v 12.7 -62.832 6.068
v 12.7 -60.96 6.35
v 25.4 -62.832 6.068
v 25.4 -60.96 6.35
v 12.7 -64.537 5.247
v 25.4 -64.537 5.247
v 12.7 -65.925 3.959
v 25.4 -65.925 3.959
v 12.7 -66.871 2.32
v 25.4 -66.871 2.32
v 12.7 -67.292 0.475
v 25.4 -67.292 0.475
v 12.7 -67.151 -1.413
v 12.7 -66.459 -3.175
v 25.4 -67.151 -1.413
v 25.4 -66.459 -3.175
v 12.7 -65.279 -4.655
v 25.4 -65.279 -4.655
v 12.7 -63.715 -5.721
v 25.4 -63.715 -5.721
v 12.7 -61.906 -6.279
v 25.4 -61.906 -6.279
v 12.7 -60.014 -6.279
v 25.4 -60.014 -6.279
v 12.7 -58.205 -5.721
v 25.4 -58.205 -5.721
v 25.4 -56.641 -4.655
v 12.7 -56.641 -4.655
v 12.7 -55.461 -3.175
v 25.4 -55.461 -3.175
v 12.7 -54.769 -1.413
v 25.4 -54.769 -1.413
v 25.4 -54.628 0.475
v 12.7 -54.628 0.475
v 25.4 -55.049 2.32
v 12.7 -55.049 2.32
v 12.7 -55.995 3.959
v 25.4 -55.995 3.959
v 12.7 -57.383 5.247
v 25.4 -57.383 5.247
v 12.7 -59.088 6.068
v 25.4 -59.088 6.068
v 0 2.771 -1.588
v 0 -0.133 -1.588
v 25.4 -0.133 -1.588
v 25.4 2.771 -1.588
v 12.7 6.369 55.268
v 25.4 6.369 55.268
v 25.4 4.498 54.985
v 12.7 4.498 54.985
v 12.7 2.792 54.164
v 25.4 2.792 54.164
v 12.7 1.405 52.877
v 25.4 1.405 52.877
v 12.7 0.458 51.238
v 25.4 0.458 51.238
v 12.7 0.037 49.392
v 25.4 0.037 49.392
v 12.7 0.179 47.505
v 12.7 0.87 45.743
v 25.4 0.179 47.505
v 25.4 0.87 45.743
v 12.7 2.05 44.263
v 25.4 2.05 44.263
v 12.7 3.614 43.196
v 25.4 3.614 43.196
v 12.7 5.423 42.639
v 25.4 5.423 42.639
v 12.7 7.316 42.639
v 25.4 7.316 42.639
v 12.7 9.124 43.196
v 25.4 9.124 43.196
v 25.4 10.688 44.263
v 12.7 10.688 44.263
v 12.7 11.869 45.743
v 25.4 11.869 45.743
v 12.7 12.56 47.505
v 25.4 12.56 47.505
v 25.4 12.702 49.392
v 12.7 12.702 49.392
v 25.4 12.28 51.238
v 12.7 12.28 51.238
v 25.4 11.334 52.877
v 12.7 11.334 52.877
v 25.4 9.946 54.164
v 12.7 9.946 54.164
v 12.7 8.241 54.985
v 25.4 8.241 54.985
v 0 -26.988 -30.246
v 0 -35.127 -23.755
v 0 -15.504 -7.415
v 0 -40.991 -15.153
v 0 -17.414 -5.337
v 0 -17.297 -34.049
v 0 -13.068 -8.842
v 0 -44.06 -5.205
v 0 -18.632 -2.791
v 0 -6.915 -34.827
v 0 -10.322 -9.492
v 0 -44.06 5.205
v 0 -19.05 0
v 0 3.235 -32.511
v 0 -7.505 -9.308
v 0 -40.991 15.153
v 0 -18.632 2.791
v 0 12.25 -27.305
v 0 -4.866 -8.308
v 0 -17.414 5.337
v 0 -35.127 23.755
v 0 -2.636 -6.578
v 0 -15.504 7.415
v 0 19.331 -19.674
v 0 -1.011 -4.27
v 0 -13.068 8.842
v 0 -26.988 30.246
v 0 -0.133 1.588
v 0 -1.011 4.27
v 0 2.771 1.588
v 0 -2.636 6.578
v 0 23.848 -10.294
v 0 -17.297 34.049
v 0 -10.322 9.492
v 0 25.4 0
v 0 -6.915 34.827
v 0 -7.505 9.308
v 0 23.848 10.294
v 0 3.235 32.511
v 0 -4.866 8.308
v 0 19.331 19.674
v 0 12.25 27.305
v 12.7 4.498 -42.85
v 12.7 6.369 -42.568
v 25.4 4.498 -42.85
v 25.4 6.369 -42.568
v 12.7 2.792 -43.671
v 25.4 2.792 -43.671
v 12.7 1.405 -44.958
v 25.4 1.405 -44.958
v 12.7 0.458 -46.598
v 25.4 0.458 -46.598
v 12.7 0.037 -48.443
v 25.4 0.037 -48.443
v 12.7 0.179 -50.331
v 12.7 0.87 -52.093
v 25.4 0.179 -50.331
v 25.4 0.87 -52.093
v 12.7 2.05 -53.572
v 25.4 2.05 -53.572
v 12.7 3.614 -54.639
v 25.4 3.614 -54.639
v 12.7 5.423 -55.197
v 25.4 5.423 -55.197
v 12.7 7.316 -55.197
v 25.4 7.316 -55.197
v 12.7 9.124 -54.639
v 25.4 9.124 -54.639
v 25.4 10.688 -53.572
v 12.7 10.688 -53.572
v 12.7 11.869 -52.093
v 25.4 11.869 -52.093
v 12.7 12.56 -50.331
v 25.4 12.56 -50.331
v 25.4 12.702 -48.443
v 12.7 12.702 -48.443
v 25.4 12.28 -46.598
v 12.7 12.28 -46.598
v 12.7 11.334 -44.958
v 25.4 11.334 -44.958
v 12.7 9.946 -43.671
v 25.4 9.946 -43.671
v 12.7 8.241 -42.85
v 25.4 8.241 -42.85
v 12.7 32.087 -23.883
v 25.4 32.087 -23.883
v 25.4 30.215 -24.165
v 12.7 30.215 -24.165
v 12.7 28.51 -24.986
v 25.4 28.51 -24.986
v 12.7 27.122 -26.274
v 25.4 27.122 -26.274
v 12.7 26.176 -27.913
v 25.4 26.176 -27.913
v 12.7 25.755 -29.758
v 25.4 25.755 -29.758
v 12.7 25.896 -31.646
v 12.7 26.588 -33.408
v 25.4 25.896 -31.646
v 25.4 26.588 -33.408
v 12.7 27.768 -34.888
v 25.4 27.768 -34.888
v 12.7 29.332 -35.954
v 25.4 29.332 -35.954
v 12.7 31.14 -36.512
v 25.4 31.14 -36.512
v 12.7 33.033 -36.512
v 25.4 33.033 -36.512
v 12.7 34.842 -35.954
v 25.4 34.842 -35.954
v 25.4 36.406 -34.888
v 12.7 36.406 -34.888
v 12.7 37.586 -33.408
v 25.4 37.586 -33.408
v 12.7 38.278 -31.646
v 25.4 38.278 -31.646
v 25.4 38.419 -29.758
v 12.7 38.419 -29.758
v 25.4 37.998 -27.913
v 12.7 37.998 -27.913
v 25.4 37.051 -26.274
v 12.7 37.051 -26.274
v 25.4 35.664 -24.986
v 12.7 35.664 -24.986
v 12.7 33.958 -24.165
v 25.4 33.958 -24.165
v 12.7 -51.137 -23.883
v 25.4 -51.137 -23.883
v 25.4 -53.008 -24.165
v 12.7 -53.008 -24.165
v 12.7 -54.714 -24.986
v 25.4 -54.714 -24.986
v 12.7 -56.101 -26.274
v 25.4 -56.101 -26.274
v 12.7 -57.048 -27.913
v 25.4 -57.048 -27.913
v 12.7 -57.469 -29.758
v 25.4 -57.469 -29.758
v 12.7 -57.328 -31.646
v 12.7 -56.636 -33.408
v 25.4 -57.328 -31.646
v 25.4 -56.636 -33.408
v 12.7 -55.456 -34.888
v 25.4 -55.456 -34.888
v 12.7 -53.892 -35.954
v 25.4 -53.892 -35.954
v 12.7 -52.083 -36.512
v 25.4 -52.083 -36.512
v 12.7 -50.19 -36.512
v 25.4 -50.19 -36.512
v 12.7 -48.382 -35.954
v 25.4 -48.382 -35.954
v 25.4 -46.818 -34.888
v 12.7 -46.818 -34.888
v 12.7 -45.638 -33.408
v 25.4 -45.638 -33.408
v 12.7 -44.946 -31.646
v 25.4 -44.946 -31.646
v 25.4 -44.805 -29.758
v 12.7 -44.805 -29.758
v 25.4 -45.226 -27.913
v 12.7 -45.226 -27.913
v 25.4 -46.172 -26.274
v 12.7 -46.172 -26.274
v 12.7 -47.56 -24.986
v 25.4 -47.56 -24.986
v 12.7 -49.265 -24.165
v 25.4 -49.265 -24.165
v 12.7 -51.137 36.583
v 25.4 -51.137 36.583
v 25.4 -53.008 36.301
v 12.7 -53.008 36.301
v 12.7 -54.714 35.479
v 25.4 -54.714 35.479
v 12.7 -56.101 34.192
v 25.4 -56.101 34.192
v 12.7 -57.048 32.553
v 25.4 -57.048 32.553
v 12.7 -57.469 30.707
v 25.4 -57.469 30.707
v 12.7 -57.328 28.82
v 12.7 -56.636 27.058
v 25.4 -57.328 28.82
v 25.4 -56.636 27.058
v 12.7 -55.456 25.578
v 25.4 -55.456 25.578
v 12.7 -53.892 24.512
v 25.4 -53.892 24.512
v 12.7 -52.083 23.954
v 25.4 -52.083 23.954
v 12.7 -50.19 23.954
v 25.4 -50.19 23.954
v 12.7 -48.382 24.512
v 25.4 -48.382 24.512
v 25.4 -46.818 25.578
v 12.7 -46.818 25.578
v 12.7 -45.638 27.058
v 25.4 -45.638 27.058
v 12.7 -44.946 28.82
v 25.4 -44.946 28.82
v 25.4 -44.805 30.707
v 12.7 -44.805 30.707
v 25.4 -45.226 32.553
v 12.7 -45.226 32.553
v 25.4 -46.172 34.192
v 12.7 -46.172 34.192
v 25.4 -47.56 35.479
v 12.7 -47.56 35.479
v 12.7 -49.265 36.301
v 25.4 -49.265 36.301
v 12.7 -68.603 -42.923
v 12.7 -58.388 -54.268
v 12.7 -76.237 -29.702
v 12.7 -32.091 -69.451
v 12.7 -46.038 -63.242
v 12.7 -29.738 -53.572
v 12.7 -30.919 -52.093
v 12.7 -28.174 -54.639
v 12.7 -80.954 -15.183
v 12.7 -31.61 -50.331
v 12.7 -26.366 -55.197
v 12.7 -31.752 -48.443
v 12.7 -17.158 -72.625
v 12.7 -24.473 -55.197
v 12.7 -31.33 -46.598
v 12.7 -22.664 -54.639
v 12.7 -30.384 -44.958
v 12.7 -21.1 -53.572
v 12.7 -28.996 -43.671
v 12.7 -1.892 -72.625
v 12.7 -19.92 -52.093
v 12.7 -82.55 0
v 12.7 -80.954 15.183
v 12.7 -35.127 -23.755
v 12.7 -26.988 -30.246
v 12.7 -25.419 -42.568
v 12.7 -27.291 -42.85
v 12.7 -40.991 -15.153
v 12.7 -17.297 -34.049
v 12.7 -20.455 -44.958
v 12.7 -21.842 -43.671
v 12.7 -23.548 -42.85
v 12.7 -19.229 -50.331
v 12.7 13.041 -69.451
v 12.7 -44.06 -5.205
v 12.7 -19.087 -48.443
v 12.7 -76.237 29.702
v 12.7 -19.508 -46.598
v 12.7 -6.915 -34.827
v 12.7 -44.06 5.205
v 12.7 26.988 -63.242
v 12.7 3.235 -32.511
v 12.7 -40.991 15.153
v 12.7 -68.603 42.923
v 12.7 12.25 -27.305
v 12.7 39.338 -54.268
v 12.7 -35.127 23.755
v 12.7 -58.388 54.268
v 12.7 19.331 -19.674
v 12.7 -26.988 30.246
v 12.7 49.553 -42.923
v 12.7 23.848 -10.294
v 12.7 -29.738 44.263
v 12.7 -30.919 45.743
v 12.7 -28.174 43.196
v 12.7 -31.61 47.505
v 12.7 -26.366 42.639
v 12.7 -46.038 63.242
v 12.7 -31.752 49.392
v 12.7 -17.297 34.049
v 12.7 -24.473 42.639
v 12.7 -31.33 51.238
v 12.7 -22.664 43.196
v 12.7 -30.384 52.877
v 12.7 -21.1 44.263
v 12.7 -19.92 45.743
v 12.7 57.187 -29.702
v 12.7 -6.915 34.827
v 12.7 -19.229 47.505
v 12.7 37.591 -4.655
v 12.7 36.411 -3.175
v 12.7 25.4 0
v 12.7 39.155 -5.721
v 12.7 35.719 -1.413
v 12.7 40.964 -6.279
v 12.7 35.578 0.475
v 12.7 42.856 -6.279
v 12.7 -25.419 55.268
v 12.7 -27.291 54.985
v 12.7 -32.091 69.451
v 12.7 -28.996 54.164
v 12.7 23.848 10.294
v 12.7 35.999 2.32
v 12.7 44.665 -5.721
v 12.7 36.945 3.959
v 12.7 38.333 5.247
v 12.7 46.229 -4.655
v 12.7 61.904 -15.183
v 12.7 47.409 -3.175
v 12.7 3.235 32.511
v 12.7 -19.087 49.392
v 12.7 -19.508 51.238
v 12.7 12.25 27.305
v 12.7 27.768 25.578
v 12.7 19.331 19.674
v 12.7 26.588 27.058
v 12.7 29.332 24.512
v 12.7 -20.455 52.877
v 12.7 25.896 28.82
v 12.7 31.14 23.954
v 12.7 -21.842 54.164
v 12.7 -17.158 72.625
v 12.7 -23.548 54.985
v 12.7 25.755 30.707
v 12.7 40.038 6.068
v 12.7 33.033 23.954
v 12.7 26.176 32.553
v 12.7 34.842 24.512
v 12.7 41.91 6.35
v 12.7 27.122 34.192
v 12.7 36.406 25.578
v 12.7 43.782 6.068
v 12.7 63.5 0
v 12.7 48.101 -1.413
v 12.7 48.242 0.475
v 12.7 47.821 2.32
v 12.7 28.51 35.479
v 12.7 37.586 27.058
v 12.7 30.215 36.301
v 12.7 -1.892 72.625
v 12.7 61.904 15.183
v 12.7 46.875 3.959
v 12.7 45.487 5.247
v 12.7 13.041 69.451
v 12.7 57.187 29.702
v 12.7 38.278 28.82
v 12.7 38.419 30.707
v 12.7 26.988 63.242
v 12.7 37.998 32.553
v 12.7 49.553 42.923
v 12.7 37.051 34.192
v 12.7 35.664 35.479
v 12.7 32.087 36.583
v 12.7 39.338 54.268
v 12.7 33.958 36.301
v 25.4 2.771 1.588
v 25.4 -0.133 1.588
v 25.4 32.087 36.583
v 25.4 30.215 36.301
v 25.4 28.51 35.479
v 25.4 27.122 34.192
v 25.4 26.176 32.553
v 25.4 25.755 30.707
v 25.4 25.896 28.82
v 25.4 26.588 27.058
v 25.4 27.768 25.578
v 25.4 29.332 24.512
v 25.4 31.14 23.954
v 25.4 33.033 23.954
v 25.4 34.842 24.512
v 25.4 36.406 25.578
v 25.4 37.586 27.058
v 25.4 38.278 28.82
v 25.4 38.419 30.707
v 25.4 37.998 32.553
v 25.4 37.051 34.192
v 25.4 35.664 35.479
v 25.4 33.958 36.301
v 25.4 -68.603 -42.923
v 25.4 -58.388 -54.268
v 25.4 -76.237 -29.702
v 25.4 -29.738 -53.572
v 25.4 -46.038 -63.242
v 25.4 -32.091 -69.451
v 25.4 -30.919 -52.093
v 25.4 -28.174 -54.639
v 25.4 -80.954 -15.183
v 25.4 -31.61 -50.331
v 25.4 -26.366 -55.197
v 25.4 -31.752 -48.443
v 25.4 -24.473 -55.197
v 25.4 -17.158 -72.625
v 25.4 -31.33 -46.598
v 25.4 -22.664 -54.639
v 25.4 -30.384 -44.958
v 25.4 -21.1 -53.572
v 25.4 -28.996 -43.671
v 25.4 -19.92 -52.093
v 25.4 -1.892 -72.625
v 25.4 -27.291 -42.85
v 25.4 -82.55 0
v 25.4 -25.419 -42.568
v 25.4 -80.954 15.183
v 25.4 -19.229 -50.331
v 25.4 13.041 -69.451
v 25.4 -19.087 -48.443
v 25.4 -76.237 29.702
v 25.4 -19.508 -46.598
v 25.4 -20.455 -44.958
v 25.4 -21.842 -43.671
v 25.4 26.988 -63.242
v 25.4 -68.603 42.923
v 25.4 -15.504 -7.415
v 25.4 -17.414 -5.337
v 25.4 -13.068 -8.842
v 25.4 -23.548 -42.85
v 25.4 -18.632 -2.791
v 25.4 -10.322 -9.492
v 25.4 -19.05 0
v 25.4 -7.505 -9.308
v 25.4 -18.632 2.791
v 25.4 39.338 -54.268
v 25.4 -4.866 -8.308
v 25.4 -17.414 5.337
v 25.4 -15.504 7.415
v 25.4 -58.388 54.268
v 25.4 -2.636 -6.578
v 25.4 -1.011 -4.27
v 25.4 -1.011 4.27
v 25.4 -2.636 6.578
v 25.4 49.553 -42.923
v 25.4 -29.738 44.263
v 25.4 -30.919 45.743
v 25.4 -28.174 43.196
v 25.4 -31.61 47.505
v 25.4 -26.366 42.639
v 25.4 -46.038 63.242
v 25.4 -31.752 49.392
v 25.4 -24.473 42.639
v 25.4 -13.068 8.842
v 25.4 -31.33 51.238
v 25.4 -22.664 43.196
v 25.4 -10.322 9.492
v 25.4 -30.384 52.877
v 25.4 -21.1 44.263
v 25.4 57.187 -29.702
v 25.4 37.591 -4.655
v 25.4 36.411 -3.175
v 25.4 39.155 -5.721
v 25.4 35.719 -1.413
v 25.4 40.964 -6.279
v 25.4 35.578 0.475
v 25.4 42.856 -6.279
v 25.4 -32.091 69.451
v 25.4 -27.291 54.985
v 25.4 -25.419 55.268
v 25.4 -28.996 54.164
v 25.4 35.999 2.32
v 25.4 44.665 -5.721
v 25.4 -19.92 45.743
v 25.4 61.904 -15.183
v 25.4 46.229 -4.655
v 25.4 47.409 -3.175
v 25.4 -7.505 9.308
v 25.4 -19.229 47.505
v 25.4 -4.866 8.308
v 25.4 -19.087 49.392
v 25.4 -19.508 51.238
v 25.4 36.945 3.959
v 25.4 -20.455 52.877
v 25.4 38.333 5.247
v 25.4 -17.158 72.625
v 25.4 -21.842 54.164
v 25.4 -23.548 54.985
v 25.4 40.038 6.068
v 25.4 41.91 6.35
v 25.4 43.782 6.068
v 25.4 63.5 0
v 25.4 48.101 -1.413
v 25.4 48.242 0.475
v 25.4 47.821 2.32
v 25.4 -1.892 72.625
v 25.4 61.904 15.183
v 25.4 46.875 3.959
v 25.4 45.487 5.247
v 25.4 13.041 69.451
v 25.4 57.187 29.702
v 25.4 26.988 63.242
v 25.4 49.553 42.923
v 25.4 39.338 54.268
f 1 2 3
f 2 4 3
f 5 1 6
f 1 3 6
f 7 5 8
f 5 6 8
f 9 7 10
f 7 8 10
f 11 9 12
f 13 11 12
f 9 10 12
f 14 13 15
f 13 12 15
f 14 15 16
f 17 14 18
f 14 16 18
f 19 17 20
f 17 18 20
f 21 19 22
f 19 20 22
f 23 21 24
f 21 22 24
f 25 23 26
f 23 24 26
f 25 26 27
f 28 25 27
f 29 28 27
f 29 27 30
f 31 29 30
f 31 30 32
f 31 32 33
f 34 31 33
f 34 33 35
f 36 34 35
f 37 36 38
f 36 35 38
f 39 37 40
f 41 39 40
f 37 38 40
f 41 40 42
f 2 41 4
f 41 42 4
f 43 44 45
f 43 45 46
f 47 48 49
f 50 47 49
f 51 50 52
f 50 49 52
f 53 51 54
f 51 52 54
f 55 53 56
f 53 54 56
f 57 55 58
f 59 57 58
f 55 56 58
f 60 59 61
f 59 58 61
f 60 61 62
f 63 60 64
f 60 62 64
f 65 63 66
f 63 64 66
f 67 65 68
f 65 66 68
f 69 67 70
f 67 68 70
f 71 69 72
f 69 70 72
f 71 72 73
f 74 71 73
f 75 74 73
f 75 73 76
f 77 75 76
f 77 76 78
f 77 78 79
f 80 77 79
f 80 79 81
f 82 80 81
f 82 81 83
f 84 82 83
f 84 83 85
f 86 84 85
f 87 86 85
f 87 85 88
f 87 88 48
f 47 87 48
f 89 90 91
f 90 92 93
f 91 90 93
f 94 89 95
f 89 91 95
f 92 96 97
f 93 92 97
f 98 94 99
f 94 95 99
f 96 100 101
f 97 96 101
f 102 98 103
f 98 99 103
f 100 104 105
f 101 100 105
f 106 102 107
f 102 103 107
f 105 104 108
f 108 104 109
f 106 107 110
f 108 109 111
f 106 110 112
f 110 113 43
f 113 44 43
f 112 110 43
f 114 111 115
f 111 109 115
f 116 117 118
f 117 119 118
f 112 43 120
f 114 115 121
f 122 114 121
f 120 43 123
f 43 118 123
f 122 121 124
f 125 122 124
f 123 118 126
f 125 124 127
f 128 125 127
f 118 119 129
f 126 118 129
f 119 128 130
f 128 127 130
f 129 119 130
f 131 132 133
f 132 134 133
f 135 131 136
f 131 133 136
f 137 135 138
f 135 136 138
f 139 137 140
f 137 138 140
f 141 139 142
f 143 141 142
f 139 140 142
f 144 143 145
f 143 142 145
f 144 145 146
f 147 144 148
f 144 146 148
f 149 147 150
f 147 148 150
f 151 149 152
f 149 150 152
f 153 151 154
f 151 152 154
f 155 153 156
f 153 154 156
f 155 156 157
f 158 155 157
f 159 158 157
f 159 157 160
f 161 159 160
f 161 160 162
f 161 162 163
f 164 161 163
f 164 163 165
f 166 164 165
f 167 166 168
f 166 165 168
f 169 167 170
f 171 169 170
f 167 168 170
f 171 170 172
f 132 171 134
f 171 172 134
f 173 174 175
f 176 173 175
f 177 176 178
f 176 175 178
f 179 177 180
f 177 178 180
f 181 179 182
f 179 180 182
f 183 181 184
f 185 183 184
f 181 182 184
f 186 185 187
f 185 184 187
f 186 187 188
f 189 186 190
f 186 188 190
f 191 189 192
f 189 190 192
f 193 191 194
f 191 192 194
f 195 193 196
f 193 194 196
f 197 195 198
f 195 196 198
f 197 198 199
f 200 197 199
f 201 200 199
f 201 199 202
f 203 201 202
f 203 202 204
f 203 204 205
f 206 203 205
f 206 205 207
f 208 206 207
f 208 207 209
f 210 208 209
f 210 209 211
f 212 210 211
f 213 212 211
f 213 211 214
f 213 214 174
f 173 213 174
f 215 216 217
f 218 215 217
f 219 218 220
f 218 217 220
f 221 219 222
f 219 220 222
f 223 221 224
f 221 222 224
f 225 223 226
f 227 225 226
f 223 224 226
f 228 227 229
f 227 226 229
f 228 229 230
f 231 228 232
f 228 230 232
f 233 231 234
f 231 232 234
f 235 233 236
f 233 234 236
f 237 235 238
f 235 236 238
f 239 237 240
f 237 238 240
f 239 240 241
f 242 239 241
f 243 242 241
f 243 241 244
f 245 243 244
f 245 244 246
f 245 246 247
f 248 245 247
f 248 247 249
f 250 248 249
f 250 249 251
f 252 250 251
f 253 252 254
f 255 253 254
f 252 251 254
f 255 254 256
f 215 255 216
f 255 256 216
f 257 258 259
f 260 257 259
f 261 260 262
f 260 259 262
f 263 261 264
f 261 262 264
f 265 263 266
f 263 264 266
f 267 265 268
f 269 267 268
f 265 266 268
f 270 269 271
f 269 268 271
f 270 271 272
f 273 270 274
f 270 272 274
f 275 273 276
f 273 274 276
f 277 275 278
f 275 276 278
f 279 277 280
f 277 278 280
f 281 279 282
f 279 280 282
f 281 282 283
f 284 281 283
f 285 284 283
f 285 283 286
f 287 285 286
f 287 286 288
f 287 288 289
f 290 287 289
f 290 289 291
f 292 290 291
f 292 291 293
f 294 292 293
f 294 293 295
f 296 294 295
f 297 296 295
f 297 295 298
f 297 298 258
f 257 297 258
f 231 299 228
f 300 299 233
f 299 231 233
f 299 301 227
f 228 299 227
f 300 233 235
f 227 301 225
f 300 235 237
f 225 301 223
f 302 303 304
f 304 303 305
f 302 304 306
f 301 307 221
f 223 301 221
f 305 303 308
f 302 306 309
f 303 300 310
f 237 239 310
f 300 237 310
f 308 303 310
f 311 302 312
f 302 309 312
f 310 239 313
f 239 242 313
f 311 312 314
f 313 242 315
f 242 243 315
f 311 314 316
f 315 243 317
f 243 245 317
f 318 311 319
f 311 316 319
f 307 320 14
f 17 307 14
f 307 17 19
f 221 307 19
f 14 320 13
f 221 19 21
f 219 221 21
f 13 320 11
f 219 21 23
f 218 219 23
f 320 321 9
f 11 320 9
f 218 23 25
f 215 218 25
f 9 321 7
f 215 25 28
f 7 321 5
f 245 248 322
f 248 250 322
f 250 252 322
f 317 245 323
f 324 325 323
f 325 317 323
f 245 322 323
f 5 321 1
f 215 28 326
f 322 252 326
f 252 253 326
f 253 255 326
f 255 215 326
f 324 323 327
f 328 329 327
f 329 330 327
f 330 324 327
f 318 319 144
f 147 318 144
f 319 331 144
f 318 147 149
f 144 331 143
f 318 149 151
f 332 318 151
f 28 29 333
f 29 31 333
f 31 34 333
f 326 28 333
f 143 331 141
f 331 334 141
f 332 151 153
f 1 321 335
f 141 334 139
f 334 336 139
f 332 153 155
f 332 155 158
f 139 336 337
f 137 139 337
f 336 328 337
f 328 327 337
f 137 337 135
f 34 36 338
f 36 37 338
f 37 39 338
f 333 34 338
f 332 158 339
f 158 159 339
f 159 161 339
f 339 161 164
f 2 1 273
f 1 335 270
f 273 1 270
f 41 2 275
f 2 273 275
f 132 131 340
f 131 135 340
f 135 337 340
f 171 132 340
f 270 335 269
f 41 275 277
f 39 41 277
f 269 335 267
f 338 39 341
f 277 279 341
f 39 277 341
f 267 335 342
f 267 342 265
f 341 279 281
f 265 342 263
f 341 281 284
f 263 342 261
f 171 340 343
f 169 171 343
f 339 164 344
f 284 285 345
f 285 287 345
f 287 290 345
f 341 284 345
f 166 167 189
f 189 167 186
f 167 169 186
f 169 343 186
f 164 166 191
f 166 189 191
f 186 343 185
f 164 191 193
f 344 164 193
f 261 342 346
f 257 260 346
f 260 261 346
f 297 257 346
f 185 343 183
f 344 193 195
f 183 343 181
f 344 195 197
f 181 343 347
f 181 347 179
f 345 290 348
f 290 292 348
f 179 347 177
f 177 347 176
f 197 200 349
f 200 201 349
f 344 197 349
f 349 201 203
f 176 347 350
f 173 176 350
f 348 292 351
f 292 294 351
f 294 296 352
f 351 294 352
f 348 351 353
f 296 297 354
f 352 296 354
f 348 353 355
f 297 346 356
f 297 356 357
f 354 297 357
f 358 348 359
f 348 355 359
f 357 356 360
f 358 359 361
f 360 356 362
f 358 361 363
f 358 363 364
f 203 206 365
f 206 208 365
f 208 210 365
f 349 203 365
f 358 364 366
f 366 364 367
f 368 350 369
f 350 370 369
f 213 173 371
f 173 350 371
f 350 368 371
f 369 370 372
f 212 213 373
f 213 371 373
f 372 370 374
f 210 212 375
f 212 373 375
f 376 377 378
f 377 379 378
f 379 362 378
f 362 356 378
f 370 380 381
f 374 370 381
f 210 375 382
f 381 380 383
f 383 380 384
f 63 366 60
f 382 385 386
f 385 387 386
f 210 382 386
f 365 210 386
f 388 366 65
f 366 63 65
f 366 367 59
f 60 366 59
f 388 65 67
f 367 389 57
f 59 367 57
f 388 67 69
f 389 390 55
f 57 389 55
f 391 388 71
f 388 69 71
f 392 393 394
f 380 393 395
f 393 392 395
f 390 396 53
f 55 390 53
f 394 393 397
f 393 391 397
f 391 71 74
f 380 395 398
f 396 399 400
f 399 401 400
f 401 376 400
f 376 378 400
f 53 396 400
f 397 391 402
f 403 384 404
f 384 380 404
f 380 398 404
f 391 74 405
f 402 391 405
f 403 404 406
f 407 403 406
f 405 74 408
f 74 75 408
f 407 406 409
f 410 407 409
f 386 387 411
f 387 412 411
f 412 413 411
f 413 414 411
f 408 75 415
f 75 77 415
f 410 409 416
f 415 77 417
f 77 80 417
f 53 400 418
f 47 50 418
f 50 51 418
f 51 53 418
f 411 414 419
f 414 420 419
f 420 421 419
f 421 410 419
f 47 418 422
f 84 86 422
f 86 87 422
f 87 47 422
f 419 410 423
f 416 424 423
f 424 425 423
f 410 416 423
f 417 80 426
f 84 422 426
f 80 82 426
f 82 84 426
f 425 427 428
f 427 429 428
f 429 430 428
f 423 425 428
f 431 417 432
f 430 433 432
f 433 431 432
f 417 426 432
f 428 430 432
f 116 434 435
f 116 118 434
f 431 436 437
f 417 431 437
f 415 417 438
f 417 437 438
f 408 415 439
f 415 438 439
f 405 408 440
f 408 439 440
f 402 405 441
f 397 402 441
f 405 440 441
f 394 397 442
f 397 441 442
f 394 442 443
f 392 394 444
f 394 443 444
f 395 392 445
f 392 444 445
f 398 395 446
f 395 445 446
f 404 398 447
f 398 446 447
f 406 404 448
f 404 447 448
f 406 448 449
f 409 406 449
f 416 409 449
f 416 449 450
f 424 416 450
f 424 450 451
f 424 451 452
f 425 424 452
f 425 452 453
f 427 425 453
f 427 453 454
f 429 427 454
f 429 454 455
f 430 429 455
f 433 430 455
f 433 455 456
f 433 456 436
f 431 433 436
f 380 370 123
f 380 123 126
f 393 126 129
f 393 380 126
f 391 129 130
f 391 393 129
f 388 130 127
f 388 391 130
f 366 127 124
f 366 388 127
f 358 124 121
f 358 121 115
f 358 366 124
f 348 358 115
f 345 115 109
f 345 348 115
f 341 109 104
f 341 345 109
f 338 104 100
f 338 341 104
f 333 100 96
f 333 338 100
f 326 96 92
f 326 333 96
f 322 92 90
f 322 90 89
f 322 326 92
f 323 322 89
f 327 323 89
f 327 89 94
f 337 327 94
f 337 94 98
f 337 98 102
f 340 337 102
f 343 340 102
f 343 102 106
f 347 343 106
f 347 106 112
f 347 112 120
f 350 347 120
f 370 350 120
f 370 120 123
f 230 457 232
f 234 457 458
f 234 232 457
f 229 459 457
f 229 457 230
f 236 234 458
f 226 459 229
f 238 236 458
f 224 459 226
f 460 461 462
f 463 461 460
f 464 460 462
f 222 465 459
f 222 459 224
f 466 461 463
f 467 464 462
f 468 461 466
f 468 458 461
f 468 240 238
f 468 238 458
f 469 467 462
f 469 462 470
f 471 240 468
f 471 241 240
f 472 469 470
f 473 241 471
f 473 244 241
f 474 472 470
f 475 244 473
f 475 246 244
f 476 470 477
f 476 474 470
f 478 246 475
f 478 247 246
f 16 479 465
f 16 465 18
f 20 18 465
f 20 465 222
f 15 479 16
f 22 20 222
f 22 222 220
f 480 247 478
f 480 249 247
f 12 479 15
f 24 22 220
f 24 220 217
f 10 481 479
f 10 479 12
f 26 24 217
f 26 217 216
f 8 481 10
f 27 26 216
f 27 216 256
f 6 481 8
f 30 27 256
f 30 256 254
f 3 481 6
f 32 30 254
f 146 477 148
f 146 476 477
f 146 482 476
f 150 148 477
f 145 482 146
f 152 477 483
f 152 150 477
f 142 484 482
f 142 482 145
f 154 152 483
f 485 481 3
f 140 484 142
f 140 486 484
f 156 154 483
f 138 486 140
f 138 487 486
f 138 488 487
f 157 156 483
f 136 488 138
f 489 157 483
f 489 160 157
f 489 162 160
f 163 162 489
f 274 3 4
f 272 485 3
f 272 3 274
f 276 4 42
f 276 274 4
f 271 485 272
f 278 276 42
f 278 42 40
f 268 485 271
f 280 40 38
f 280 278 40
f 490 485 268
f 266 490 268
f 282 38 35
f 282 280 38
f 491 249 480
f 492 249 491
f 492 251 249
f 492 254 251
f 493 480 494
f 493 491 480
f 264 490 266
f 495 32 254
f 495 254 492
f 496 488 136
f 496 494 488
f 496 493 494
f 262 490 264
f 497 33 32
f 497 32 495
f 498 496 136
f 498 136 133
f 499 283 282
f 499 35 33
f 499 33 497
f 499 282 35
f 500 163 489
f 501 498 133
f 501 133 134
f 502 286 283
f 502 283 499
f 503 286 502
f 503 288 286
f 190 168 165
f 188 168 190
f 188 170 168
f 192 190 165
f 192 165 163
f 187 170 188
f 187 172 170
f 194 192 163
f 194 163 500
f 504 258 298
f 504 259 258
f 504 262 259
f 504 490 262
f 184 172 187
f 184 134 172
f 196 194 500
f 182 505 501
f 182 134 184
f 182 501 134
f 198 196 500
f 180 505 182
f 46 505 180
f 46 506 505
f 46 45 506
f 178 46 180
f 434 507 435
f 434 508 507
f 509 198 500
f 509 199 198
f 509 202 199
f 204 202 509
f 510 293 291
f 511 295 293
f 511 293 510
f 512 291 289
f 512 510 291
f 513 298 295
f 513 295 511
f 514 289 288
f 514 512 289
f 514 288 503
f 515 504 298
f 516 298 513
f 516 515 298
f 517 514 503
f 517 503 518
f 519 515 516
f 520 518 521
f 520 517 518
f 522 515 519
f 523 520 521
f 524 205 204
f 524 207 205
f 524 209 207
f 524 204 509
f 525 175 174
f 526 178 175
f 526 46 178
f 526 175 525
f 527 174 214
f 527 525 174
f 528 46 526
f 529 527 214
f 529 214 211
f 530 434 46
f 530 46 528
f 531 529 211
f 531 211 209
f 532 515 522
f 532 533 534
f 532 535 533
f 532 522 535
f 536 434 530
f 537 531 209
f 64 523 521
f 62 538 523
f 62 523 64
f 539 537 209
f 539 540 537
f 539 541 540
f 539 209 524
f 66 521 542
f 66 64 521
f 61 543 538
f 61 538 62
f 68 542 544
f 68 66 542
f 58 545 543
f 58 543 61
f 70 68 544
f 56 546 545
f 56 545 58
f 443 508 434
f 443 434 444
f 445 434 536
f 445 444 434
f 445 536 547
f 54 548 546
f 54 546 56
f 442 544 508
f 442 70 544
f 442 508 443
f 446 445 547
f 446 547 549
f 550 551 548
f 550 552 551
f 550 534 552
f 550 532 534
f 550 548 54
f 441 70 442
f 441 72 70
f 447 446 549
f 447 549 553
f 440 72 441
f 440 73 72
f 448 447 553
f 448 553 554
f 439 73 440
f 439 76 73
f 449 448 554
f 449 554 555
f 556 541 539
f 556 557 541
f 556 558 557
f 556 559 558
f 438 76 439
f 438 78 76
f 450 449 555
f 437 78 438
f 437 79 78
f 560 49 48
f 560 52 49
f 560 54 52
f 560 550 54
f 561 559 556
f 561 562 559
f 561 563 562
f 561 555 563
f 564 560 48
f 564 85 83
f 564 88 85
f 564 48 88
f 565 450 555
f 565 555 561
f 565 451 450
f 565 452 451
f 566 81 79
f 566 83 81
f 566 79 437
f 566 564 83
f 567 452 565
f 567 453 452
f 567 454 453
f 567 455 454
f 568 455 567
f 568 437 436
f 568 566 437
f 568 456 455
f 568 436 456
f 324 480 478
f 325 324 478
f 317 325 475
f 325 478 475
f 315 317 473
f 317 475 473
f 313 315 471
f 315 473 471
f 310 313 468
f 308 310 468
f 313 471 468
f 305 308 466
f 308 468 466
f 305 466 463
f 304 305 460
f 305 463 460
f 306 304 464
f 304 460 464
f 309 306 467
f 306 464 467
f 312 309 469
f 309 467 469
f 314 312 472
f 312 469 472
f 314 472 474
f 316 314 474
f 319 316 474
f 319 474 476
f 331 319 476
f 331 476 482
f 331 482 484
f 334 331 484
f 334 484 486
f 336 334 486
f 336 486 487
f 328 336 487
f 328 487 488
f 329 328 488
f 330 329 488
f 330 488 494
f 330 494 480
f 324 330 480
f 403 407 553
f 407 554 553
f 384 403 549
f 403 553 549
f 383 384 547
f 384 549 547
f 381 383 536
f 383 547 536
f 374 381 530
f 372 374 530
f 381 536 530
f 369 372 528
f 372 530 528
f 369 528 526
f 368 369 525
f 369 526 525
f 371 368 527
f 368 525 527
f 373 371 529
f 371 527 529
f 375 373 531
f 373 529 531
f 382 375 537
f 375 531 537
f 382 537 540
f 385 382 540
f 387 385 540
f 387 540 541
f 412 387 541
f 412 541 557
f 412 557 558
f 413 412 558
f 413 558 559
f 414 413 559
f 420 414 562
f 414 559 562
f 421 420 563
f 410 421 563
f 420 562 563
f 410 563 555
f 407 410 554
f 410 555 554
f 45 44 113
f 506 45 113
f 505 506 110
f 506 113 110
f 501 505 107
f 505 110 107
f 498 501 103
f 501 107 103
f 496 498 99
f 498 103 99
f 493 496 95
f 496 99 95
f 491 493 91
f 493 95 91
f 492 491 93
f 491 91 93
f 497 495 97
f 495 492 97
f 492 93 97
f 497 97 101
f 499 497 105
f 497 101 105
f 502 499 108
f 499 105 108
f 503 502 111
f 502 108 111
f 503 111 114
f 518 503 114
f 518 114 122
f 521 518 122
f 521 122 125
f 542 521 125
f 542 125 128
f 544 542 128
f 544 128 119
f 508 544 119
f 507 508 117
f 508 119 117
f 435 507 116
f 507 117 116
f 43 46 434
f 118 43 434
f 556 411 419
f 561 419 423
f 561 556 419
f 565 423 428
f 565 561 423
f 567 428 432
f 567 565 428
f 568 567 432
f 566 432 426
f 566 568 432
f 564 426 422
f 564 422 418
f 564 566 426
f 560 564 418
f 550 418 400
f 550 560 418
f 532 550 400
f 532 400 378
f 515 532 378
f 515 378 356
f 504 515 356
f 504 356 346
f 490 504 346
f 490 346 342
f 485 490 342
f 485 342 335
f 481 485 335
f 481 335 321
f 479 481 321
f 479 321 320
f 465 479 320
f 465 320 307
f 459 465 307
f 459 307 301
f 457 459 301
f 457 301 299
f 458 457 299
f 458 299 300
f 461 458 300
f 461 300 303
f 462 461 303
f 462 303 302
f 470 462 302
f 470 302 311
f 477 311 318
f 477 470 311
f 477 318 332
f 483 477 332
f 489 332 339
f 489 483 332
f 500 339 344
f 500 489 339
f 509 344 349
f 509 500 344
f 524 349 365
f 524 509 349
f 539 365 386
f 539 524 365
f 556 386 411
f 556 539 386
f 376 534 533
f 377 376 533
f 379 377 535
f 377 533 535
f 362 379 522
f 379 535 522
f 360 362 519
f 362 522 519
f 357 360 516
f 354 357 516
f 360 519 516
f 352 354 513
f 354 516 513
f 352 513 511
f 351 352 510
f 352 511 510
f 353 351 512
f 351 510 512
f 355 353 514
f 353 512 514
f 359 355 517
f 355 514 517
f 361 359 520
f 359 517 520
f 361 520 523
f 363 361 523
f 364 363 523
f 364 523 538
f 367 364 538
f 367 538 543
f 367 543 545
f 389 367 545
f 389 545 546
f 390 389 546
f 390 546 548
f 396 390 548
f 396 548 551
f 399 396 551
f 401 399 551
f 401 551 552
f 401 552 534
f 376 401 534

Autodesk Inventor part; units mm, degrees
ref_plane "YZ Plane" through (0, 0, 0) normal (1, 0, 0) x (0, 1, 0)
ref_plane "XZ Plane" through (0, 0, 0) normal (0, 1, 0) x (-1, 0, 0)
ref_plane "XY Plane" through (0, 0, 0) normal (0, 0, 1) x (1, 0, 0)
sketch "Sketch1" plane through (0, 0, 0) normal (0, 0, 1) x (1, 0, 0)
  line L0 (0, 0) -> (0, 25.4)
  line L1 (0, 25.4) -> (12.7, 25.4)
  line L2 (12.7, 25.4) -> (12.7, 63.5)
  line L3 (12.7, 63.5) -> (25.4, 63.5)
  line L4 (25.4, 63.5) -> (25.4, 0)
  line L5 (25.4, 0) -> (0, 0)
  line L6 (0, -9.525) -> (25.4, -9.525)
  dimension "d0" = 25.4
  dimension "d1" = 63.5
  dimension "d2" = 12.7
  dimension "d3" = 25.4
  dimension "d4" = 9.525
revolve "Revolution1" add sketch "Sketch1" angle 360 about axis through (0, -9.525, 0) along (1, 0, 0)
sketch "Sketch2" plane through (12.7, -9.525, 0) normal (-1, 0, 0) x (0, 0, 1)
  circle A0 centre (0, 0) radius 51.435 construction
  circle A1 centre (0, 0) radius 9.525 projected
  circle A2 centre (0, 0) radius 73.025 projected
  circle A3 centre (0, 0) radius 34.925 projected
  point P0 (0, 9.525)
  point P1 (0, 51.435)
  point P2 (-30.2327, 41.6118)
  point P3 (-48.9176, 15.8943)
  point P4 (-48.9176, -15.8943)
  point P5 (-30.2327, -41.6118)
  point P6 (0, -51.435)
  point P7 (30.2327, -41.6118)
  point P8 (48.9176, -15.8943)
  point P9 (48.9176, 15.8943)
  point P10 (30.2327, 41.6118)
  dimension "d7" = 41.91
  dimension "d17" = 360
hole "Hole1" at (12.7, 41.91, 0) direction (1, 0, 0) diameter 12.7 end through all
hole "Hole2" at (12.7, 32.0868, -30.2327) at (12.7, 6.3693, -48.9176) at (12.7, -25.4193, -48.9176) at (12.7, -51.1368, -30.2327) at (12.7, -60.96, 0) at (12.7, -51.1368, 30.2327) at (12.7, -25.4193, 48.9176) at (12.7, 6.3693, 48.9176) at (12.7, 32.0868, 30.2327) direction (1, 0, 0) diameter 12.7 end through all
sketch "Sketch3" plane through (0, -9.525, 0) normal (-1, 0, 0) x (0, 0, 1)
  line L0 (-1.5875, 12.2962) -> (1.5875, 12.2962)
  line L1 (1.5875, 12.2962) -> (1.5875, 9.1212)
  line L2 (1.5875, 9.1212) -> (-1.5875, 9.1212)
  line L3 (-1.5875, 9.1212) -> (-1.5875, 12.2962)
  circle A0 centre (48.9176, 15.8943) radius 6.35 projected
  circle A1 centre (0, 51.435) radius 6.35 projected
  point P0 (0, 9.525)
  point P1 (0, 9.1212)
  point P2 (0, 12.2759)
  dimension "d26" = 3.175
  dimension "d27" = 3.175
  dimension "d29" = 1.5875
  dimension "d30" = 48.9176
  dimension "d31" = 0
  dimension "d33" = 42.3138
  dimension "d34" = 0
extrude "Extrusion1" cut sketch "Sketch3" against normal blind 50.8 contours L0 L1 L2 L3
properties part number "CircularPattern"
